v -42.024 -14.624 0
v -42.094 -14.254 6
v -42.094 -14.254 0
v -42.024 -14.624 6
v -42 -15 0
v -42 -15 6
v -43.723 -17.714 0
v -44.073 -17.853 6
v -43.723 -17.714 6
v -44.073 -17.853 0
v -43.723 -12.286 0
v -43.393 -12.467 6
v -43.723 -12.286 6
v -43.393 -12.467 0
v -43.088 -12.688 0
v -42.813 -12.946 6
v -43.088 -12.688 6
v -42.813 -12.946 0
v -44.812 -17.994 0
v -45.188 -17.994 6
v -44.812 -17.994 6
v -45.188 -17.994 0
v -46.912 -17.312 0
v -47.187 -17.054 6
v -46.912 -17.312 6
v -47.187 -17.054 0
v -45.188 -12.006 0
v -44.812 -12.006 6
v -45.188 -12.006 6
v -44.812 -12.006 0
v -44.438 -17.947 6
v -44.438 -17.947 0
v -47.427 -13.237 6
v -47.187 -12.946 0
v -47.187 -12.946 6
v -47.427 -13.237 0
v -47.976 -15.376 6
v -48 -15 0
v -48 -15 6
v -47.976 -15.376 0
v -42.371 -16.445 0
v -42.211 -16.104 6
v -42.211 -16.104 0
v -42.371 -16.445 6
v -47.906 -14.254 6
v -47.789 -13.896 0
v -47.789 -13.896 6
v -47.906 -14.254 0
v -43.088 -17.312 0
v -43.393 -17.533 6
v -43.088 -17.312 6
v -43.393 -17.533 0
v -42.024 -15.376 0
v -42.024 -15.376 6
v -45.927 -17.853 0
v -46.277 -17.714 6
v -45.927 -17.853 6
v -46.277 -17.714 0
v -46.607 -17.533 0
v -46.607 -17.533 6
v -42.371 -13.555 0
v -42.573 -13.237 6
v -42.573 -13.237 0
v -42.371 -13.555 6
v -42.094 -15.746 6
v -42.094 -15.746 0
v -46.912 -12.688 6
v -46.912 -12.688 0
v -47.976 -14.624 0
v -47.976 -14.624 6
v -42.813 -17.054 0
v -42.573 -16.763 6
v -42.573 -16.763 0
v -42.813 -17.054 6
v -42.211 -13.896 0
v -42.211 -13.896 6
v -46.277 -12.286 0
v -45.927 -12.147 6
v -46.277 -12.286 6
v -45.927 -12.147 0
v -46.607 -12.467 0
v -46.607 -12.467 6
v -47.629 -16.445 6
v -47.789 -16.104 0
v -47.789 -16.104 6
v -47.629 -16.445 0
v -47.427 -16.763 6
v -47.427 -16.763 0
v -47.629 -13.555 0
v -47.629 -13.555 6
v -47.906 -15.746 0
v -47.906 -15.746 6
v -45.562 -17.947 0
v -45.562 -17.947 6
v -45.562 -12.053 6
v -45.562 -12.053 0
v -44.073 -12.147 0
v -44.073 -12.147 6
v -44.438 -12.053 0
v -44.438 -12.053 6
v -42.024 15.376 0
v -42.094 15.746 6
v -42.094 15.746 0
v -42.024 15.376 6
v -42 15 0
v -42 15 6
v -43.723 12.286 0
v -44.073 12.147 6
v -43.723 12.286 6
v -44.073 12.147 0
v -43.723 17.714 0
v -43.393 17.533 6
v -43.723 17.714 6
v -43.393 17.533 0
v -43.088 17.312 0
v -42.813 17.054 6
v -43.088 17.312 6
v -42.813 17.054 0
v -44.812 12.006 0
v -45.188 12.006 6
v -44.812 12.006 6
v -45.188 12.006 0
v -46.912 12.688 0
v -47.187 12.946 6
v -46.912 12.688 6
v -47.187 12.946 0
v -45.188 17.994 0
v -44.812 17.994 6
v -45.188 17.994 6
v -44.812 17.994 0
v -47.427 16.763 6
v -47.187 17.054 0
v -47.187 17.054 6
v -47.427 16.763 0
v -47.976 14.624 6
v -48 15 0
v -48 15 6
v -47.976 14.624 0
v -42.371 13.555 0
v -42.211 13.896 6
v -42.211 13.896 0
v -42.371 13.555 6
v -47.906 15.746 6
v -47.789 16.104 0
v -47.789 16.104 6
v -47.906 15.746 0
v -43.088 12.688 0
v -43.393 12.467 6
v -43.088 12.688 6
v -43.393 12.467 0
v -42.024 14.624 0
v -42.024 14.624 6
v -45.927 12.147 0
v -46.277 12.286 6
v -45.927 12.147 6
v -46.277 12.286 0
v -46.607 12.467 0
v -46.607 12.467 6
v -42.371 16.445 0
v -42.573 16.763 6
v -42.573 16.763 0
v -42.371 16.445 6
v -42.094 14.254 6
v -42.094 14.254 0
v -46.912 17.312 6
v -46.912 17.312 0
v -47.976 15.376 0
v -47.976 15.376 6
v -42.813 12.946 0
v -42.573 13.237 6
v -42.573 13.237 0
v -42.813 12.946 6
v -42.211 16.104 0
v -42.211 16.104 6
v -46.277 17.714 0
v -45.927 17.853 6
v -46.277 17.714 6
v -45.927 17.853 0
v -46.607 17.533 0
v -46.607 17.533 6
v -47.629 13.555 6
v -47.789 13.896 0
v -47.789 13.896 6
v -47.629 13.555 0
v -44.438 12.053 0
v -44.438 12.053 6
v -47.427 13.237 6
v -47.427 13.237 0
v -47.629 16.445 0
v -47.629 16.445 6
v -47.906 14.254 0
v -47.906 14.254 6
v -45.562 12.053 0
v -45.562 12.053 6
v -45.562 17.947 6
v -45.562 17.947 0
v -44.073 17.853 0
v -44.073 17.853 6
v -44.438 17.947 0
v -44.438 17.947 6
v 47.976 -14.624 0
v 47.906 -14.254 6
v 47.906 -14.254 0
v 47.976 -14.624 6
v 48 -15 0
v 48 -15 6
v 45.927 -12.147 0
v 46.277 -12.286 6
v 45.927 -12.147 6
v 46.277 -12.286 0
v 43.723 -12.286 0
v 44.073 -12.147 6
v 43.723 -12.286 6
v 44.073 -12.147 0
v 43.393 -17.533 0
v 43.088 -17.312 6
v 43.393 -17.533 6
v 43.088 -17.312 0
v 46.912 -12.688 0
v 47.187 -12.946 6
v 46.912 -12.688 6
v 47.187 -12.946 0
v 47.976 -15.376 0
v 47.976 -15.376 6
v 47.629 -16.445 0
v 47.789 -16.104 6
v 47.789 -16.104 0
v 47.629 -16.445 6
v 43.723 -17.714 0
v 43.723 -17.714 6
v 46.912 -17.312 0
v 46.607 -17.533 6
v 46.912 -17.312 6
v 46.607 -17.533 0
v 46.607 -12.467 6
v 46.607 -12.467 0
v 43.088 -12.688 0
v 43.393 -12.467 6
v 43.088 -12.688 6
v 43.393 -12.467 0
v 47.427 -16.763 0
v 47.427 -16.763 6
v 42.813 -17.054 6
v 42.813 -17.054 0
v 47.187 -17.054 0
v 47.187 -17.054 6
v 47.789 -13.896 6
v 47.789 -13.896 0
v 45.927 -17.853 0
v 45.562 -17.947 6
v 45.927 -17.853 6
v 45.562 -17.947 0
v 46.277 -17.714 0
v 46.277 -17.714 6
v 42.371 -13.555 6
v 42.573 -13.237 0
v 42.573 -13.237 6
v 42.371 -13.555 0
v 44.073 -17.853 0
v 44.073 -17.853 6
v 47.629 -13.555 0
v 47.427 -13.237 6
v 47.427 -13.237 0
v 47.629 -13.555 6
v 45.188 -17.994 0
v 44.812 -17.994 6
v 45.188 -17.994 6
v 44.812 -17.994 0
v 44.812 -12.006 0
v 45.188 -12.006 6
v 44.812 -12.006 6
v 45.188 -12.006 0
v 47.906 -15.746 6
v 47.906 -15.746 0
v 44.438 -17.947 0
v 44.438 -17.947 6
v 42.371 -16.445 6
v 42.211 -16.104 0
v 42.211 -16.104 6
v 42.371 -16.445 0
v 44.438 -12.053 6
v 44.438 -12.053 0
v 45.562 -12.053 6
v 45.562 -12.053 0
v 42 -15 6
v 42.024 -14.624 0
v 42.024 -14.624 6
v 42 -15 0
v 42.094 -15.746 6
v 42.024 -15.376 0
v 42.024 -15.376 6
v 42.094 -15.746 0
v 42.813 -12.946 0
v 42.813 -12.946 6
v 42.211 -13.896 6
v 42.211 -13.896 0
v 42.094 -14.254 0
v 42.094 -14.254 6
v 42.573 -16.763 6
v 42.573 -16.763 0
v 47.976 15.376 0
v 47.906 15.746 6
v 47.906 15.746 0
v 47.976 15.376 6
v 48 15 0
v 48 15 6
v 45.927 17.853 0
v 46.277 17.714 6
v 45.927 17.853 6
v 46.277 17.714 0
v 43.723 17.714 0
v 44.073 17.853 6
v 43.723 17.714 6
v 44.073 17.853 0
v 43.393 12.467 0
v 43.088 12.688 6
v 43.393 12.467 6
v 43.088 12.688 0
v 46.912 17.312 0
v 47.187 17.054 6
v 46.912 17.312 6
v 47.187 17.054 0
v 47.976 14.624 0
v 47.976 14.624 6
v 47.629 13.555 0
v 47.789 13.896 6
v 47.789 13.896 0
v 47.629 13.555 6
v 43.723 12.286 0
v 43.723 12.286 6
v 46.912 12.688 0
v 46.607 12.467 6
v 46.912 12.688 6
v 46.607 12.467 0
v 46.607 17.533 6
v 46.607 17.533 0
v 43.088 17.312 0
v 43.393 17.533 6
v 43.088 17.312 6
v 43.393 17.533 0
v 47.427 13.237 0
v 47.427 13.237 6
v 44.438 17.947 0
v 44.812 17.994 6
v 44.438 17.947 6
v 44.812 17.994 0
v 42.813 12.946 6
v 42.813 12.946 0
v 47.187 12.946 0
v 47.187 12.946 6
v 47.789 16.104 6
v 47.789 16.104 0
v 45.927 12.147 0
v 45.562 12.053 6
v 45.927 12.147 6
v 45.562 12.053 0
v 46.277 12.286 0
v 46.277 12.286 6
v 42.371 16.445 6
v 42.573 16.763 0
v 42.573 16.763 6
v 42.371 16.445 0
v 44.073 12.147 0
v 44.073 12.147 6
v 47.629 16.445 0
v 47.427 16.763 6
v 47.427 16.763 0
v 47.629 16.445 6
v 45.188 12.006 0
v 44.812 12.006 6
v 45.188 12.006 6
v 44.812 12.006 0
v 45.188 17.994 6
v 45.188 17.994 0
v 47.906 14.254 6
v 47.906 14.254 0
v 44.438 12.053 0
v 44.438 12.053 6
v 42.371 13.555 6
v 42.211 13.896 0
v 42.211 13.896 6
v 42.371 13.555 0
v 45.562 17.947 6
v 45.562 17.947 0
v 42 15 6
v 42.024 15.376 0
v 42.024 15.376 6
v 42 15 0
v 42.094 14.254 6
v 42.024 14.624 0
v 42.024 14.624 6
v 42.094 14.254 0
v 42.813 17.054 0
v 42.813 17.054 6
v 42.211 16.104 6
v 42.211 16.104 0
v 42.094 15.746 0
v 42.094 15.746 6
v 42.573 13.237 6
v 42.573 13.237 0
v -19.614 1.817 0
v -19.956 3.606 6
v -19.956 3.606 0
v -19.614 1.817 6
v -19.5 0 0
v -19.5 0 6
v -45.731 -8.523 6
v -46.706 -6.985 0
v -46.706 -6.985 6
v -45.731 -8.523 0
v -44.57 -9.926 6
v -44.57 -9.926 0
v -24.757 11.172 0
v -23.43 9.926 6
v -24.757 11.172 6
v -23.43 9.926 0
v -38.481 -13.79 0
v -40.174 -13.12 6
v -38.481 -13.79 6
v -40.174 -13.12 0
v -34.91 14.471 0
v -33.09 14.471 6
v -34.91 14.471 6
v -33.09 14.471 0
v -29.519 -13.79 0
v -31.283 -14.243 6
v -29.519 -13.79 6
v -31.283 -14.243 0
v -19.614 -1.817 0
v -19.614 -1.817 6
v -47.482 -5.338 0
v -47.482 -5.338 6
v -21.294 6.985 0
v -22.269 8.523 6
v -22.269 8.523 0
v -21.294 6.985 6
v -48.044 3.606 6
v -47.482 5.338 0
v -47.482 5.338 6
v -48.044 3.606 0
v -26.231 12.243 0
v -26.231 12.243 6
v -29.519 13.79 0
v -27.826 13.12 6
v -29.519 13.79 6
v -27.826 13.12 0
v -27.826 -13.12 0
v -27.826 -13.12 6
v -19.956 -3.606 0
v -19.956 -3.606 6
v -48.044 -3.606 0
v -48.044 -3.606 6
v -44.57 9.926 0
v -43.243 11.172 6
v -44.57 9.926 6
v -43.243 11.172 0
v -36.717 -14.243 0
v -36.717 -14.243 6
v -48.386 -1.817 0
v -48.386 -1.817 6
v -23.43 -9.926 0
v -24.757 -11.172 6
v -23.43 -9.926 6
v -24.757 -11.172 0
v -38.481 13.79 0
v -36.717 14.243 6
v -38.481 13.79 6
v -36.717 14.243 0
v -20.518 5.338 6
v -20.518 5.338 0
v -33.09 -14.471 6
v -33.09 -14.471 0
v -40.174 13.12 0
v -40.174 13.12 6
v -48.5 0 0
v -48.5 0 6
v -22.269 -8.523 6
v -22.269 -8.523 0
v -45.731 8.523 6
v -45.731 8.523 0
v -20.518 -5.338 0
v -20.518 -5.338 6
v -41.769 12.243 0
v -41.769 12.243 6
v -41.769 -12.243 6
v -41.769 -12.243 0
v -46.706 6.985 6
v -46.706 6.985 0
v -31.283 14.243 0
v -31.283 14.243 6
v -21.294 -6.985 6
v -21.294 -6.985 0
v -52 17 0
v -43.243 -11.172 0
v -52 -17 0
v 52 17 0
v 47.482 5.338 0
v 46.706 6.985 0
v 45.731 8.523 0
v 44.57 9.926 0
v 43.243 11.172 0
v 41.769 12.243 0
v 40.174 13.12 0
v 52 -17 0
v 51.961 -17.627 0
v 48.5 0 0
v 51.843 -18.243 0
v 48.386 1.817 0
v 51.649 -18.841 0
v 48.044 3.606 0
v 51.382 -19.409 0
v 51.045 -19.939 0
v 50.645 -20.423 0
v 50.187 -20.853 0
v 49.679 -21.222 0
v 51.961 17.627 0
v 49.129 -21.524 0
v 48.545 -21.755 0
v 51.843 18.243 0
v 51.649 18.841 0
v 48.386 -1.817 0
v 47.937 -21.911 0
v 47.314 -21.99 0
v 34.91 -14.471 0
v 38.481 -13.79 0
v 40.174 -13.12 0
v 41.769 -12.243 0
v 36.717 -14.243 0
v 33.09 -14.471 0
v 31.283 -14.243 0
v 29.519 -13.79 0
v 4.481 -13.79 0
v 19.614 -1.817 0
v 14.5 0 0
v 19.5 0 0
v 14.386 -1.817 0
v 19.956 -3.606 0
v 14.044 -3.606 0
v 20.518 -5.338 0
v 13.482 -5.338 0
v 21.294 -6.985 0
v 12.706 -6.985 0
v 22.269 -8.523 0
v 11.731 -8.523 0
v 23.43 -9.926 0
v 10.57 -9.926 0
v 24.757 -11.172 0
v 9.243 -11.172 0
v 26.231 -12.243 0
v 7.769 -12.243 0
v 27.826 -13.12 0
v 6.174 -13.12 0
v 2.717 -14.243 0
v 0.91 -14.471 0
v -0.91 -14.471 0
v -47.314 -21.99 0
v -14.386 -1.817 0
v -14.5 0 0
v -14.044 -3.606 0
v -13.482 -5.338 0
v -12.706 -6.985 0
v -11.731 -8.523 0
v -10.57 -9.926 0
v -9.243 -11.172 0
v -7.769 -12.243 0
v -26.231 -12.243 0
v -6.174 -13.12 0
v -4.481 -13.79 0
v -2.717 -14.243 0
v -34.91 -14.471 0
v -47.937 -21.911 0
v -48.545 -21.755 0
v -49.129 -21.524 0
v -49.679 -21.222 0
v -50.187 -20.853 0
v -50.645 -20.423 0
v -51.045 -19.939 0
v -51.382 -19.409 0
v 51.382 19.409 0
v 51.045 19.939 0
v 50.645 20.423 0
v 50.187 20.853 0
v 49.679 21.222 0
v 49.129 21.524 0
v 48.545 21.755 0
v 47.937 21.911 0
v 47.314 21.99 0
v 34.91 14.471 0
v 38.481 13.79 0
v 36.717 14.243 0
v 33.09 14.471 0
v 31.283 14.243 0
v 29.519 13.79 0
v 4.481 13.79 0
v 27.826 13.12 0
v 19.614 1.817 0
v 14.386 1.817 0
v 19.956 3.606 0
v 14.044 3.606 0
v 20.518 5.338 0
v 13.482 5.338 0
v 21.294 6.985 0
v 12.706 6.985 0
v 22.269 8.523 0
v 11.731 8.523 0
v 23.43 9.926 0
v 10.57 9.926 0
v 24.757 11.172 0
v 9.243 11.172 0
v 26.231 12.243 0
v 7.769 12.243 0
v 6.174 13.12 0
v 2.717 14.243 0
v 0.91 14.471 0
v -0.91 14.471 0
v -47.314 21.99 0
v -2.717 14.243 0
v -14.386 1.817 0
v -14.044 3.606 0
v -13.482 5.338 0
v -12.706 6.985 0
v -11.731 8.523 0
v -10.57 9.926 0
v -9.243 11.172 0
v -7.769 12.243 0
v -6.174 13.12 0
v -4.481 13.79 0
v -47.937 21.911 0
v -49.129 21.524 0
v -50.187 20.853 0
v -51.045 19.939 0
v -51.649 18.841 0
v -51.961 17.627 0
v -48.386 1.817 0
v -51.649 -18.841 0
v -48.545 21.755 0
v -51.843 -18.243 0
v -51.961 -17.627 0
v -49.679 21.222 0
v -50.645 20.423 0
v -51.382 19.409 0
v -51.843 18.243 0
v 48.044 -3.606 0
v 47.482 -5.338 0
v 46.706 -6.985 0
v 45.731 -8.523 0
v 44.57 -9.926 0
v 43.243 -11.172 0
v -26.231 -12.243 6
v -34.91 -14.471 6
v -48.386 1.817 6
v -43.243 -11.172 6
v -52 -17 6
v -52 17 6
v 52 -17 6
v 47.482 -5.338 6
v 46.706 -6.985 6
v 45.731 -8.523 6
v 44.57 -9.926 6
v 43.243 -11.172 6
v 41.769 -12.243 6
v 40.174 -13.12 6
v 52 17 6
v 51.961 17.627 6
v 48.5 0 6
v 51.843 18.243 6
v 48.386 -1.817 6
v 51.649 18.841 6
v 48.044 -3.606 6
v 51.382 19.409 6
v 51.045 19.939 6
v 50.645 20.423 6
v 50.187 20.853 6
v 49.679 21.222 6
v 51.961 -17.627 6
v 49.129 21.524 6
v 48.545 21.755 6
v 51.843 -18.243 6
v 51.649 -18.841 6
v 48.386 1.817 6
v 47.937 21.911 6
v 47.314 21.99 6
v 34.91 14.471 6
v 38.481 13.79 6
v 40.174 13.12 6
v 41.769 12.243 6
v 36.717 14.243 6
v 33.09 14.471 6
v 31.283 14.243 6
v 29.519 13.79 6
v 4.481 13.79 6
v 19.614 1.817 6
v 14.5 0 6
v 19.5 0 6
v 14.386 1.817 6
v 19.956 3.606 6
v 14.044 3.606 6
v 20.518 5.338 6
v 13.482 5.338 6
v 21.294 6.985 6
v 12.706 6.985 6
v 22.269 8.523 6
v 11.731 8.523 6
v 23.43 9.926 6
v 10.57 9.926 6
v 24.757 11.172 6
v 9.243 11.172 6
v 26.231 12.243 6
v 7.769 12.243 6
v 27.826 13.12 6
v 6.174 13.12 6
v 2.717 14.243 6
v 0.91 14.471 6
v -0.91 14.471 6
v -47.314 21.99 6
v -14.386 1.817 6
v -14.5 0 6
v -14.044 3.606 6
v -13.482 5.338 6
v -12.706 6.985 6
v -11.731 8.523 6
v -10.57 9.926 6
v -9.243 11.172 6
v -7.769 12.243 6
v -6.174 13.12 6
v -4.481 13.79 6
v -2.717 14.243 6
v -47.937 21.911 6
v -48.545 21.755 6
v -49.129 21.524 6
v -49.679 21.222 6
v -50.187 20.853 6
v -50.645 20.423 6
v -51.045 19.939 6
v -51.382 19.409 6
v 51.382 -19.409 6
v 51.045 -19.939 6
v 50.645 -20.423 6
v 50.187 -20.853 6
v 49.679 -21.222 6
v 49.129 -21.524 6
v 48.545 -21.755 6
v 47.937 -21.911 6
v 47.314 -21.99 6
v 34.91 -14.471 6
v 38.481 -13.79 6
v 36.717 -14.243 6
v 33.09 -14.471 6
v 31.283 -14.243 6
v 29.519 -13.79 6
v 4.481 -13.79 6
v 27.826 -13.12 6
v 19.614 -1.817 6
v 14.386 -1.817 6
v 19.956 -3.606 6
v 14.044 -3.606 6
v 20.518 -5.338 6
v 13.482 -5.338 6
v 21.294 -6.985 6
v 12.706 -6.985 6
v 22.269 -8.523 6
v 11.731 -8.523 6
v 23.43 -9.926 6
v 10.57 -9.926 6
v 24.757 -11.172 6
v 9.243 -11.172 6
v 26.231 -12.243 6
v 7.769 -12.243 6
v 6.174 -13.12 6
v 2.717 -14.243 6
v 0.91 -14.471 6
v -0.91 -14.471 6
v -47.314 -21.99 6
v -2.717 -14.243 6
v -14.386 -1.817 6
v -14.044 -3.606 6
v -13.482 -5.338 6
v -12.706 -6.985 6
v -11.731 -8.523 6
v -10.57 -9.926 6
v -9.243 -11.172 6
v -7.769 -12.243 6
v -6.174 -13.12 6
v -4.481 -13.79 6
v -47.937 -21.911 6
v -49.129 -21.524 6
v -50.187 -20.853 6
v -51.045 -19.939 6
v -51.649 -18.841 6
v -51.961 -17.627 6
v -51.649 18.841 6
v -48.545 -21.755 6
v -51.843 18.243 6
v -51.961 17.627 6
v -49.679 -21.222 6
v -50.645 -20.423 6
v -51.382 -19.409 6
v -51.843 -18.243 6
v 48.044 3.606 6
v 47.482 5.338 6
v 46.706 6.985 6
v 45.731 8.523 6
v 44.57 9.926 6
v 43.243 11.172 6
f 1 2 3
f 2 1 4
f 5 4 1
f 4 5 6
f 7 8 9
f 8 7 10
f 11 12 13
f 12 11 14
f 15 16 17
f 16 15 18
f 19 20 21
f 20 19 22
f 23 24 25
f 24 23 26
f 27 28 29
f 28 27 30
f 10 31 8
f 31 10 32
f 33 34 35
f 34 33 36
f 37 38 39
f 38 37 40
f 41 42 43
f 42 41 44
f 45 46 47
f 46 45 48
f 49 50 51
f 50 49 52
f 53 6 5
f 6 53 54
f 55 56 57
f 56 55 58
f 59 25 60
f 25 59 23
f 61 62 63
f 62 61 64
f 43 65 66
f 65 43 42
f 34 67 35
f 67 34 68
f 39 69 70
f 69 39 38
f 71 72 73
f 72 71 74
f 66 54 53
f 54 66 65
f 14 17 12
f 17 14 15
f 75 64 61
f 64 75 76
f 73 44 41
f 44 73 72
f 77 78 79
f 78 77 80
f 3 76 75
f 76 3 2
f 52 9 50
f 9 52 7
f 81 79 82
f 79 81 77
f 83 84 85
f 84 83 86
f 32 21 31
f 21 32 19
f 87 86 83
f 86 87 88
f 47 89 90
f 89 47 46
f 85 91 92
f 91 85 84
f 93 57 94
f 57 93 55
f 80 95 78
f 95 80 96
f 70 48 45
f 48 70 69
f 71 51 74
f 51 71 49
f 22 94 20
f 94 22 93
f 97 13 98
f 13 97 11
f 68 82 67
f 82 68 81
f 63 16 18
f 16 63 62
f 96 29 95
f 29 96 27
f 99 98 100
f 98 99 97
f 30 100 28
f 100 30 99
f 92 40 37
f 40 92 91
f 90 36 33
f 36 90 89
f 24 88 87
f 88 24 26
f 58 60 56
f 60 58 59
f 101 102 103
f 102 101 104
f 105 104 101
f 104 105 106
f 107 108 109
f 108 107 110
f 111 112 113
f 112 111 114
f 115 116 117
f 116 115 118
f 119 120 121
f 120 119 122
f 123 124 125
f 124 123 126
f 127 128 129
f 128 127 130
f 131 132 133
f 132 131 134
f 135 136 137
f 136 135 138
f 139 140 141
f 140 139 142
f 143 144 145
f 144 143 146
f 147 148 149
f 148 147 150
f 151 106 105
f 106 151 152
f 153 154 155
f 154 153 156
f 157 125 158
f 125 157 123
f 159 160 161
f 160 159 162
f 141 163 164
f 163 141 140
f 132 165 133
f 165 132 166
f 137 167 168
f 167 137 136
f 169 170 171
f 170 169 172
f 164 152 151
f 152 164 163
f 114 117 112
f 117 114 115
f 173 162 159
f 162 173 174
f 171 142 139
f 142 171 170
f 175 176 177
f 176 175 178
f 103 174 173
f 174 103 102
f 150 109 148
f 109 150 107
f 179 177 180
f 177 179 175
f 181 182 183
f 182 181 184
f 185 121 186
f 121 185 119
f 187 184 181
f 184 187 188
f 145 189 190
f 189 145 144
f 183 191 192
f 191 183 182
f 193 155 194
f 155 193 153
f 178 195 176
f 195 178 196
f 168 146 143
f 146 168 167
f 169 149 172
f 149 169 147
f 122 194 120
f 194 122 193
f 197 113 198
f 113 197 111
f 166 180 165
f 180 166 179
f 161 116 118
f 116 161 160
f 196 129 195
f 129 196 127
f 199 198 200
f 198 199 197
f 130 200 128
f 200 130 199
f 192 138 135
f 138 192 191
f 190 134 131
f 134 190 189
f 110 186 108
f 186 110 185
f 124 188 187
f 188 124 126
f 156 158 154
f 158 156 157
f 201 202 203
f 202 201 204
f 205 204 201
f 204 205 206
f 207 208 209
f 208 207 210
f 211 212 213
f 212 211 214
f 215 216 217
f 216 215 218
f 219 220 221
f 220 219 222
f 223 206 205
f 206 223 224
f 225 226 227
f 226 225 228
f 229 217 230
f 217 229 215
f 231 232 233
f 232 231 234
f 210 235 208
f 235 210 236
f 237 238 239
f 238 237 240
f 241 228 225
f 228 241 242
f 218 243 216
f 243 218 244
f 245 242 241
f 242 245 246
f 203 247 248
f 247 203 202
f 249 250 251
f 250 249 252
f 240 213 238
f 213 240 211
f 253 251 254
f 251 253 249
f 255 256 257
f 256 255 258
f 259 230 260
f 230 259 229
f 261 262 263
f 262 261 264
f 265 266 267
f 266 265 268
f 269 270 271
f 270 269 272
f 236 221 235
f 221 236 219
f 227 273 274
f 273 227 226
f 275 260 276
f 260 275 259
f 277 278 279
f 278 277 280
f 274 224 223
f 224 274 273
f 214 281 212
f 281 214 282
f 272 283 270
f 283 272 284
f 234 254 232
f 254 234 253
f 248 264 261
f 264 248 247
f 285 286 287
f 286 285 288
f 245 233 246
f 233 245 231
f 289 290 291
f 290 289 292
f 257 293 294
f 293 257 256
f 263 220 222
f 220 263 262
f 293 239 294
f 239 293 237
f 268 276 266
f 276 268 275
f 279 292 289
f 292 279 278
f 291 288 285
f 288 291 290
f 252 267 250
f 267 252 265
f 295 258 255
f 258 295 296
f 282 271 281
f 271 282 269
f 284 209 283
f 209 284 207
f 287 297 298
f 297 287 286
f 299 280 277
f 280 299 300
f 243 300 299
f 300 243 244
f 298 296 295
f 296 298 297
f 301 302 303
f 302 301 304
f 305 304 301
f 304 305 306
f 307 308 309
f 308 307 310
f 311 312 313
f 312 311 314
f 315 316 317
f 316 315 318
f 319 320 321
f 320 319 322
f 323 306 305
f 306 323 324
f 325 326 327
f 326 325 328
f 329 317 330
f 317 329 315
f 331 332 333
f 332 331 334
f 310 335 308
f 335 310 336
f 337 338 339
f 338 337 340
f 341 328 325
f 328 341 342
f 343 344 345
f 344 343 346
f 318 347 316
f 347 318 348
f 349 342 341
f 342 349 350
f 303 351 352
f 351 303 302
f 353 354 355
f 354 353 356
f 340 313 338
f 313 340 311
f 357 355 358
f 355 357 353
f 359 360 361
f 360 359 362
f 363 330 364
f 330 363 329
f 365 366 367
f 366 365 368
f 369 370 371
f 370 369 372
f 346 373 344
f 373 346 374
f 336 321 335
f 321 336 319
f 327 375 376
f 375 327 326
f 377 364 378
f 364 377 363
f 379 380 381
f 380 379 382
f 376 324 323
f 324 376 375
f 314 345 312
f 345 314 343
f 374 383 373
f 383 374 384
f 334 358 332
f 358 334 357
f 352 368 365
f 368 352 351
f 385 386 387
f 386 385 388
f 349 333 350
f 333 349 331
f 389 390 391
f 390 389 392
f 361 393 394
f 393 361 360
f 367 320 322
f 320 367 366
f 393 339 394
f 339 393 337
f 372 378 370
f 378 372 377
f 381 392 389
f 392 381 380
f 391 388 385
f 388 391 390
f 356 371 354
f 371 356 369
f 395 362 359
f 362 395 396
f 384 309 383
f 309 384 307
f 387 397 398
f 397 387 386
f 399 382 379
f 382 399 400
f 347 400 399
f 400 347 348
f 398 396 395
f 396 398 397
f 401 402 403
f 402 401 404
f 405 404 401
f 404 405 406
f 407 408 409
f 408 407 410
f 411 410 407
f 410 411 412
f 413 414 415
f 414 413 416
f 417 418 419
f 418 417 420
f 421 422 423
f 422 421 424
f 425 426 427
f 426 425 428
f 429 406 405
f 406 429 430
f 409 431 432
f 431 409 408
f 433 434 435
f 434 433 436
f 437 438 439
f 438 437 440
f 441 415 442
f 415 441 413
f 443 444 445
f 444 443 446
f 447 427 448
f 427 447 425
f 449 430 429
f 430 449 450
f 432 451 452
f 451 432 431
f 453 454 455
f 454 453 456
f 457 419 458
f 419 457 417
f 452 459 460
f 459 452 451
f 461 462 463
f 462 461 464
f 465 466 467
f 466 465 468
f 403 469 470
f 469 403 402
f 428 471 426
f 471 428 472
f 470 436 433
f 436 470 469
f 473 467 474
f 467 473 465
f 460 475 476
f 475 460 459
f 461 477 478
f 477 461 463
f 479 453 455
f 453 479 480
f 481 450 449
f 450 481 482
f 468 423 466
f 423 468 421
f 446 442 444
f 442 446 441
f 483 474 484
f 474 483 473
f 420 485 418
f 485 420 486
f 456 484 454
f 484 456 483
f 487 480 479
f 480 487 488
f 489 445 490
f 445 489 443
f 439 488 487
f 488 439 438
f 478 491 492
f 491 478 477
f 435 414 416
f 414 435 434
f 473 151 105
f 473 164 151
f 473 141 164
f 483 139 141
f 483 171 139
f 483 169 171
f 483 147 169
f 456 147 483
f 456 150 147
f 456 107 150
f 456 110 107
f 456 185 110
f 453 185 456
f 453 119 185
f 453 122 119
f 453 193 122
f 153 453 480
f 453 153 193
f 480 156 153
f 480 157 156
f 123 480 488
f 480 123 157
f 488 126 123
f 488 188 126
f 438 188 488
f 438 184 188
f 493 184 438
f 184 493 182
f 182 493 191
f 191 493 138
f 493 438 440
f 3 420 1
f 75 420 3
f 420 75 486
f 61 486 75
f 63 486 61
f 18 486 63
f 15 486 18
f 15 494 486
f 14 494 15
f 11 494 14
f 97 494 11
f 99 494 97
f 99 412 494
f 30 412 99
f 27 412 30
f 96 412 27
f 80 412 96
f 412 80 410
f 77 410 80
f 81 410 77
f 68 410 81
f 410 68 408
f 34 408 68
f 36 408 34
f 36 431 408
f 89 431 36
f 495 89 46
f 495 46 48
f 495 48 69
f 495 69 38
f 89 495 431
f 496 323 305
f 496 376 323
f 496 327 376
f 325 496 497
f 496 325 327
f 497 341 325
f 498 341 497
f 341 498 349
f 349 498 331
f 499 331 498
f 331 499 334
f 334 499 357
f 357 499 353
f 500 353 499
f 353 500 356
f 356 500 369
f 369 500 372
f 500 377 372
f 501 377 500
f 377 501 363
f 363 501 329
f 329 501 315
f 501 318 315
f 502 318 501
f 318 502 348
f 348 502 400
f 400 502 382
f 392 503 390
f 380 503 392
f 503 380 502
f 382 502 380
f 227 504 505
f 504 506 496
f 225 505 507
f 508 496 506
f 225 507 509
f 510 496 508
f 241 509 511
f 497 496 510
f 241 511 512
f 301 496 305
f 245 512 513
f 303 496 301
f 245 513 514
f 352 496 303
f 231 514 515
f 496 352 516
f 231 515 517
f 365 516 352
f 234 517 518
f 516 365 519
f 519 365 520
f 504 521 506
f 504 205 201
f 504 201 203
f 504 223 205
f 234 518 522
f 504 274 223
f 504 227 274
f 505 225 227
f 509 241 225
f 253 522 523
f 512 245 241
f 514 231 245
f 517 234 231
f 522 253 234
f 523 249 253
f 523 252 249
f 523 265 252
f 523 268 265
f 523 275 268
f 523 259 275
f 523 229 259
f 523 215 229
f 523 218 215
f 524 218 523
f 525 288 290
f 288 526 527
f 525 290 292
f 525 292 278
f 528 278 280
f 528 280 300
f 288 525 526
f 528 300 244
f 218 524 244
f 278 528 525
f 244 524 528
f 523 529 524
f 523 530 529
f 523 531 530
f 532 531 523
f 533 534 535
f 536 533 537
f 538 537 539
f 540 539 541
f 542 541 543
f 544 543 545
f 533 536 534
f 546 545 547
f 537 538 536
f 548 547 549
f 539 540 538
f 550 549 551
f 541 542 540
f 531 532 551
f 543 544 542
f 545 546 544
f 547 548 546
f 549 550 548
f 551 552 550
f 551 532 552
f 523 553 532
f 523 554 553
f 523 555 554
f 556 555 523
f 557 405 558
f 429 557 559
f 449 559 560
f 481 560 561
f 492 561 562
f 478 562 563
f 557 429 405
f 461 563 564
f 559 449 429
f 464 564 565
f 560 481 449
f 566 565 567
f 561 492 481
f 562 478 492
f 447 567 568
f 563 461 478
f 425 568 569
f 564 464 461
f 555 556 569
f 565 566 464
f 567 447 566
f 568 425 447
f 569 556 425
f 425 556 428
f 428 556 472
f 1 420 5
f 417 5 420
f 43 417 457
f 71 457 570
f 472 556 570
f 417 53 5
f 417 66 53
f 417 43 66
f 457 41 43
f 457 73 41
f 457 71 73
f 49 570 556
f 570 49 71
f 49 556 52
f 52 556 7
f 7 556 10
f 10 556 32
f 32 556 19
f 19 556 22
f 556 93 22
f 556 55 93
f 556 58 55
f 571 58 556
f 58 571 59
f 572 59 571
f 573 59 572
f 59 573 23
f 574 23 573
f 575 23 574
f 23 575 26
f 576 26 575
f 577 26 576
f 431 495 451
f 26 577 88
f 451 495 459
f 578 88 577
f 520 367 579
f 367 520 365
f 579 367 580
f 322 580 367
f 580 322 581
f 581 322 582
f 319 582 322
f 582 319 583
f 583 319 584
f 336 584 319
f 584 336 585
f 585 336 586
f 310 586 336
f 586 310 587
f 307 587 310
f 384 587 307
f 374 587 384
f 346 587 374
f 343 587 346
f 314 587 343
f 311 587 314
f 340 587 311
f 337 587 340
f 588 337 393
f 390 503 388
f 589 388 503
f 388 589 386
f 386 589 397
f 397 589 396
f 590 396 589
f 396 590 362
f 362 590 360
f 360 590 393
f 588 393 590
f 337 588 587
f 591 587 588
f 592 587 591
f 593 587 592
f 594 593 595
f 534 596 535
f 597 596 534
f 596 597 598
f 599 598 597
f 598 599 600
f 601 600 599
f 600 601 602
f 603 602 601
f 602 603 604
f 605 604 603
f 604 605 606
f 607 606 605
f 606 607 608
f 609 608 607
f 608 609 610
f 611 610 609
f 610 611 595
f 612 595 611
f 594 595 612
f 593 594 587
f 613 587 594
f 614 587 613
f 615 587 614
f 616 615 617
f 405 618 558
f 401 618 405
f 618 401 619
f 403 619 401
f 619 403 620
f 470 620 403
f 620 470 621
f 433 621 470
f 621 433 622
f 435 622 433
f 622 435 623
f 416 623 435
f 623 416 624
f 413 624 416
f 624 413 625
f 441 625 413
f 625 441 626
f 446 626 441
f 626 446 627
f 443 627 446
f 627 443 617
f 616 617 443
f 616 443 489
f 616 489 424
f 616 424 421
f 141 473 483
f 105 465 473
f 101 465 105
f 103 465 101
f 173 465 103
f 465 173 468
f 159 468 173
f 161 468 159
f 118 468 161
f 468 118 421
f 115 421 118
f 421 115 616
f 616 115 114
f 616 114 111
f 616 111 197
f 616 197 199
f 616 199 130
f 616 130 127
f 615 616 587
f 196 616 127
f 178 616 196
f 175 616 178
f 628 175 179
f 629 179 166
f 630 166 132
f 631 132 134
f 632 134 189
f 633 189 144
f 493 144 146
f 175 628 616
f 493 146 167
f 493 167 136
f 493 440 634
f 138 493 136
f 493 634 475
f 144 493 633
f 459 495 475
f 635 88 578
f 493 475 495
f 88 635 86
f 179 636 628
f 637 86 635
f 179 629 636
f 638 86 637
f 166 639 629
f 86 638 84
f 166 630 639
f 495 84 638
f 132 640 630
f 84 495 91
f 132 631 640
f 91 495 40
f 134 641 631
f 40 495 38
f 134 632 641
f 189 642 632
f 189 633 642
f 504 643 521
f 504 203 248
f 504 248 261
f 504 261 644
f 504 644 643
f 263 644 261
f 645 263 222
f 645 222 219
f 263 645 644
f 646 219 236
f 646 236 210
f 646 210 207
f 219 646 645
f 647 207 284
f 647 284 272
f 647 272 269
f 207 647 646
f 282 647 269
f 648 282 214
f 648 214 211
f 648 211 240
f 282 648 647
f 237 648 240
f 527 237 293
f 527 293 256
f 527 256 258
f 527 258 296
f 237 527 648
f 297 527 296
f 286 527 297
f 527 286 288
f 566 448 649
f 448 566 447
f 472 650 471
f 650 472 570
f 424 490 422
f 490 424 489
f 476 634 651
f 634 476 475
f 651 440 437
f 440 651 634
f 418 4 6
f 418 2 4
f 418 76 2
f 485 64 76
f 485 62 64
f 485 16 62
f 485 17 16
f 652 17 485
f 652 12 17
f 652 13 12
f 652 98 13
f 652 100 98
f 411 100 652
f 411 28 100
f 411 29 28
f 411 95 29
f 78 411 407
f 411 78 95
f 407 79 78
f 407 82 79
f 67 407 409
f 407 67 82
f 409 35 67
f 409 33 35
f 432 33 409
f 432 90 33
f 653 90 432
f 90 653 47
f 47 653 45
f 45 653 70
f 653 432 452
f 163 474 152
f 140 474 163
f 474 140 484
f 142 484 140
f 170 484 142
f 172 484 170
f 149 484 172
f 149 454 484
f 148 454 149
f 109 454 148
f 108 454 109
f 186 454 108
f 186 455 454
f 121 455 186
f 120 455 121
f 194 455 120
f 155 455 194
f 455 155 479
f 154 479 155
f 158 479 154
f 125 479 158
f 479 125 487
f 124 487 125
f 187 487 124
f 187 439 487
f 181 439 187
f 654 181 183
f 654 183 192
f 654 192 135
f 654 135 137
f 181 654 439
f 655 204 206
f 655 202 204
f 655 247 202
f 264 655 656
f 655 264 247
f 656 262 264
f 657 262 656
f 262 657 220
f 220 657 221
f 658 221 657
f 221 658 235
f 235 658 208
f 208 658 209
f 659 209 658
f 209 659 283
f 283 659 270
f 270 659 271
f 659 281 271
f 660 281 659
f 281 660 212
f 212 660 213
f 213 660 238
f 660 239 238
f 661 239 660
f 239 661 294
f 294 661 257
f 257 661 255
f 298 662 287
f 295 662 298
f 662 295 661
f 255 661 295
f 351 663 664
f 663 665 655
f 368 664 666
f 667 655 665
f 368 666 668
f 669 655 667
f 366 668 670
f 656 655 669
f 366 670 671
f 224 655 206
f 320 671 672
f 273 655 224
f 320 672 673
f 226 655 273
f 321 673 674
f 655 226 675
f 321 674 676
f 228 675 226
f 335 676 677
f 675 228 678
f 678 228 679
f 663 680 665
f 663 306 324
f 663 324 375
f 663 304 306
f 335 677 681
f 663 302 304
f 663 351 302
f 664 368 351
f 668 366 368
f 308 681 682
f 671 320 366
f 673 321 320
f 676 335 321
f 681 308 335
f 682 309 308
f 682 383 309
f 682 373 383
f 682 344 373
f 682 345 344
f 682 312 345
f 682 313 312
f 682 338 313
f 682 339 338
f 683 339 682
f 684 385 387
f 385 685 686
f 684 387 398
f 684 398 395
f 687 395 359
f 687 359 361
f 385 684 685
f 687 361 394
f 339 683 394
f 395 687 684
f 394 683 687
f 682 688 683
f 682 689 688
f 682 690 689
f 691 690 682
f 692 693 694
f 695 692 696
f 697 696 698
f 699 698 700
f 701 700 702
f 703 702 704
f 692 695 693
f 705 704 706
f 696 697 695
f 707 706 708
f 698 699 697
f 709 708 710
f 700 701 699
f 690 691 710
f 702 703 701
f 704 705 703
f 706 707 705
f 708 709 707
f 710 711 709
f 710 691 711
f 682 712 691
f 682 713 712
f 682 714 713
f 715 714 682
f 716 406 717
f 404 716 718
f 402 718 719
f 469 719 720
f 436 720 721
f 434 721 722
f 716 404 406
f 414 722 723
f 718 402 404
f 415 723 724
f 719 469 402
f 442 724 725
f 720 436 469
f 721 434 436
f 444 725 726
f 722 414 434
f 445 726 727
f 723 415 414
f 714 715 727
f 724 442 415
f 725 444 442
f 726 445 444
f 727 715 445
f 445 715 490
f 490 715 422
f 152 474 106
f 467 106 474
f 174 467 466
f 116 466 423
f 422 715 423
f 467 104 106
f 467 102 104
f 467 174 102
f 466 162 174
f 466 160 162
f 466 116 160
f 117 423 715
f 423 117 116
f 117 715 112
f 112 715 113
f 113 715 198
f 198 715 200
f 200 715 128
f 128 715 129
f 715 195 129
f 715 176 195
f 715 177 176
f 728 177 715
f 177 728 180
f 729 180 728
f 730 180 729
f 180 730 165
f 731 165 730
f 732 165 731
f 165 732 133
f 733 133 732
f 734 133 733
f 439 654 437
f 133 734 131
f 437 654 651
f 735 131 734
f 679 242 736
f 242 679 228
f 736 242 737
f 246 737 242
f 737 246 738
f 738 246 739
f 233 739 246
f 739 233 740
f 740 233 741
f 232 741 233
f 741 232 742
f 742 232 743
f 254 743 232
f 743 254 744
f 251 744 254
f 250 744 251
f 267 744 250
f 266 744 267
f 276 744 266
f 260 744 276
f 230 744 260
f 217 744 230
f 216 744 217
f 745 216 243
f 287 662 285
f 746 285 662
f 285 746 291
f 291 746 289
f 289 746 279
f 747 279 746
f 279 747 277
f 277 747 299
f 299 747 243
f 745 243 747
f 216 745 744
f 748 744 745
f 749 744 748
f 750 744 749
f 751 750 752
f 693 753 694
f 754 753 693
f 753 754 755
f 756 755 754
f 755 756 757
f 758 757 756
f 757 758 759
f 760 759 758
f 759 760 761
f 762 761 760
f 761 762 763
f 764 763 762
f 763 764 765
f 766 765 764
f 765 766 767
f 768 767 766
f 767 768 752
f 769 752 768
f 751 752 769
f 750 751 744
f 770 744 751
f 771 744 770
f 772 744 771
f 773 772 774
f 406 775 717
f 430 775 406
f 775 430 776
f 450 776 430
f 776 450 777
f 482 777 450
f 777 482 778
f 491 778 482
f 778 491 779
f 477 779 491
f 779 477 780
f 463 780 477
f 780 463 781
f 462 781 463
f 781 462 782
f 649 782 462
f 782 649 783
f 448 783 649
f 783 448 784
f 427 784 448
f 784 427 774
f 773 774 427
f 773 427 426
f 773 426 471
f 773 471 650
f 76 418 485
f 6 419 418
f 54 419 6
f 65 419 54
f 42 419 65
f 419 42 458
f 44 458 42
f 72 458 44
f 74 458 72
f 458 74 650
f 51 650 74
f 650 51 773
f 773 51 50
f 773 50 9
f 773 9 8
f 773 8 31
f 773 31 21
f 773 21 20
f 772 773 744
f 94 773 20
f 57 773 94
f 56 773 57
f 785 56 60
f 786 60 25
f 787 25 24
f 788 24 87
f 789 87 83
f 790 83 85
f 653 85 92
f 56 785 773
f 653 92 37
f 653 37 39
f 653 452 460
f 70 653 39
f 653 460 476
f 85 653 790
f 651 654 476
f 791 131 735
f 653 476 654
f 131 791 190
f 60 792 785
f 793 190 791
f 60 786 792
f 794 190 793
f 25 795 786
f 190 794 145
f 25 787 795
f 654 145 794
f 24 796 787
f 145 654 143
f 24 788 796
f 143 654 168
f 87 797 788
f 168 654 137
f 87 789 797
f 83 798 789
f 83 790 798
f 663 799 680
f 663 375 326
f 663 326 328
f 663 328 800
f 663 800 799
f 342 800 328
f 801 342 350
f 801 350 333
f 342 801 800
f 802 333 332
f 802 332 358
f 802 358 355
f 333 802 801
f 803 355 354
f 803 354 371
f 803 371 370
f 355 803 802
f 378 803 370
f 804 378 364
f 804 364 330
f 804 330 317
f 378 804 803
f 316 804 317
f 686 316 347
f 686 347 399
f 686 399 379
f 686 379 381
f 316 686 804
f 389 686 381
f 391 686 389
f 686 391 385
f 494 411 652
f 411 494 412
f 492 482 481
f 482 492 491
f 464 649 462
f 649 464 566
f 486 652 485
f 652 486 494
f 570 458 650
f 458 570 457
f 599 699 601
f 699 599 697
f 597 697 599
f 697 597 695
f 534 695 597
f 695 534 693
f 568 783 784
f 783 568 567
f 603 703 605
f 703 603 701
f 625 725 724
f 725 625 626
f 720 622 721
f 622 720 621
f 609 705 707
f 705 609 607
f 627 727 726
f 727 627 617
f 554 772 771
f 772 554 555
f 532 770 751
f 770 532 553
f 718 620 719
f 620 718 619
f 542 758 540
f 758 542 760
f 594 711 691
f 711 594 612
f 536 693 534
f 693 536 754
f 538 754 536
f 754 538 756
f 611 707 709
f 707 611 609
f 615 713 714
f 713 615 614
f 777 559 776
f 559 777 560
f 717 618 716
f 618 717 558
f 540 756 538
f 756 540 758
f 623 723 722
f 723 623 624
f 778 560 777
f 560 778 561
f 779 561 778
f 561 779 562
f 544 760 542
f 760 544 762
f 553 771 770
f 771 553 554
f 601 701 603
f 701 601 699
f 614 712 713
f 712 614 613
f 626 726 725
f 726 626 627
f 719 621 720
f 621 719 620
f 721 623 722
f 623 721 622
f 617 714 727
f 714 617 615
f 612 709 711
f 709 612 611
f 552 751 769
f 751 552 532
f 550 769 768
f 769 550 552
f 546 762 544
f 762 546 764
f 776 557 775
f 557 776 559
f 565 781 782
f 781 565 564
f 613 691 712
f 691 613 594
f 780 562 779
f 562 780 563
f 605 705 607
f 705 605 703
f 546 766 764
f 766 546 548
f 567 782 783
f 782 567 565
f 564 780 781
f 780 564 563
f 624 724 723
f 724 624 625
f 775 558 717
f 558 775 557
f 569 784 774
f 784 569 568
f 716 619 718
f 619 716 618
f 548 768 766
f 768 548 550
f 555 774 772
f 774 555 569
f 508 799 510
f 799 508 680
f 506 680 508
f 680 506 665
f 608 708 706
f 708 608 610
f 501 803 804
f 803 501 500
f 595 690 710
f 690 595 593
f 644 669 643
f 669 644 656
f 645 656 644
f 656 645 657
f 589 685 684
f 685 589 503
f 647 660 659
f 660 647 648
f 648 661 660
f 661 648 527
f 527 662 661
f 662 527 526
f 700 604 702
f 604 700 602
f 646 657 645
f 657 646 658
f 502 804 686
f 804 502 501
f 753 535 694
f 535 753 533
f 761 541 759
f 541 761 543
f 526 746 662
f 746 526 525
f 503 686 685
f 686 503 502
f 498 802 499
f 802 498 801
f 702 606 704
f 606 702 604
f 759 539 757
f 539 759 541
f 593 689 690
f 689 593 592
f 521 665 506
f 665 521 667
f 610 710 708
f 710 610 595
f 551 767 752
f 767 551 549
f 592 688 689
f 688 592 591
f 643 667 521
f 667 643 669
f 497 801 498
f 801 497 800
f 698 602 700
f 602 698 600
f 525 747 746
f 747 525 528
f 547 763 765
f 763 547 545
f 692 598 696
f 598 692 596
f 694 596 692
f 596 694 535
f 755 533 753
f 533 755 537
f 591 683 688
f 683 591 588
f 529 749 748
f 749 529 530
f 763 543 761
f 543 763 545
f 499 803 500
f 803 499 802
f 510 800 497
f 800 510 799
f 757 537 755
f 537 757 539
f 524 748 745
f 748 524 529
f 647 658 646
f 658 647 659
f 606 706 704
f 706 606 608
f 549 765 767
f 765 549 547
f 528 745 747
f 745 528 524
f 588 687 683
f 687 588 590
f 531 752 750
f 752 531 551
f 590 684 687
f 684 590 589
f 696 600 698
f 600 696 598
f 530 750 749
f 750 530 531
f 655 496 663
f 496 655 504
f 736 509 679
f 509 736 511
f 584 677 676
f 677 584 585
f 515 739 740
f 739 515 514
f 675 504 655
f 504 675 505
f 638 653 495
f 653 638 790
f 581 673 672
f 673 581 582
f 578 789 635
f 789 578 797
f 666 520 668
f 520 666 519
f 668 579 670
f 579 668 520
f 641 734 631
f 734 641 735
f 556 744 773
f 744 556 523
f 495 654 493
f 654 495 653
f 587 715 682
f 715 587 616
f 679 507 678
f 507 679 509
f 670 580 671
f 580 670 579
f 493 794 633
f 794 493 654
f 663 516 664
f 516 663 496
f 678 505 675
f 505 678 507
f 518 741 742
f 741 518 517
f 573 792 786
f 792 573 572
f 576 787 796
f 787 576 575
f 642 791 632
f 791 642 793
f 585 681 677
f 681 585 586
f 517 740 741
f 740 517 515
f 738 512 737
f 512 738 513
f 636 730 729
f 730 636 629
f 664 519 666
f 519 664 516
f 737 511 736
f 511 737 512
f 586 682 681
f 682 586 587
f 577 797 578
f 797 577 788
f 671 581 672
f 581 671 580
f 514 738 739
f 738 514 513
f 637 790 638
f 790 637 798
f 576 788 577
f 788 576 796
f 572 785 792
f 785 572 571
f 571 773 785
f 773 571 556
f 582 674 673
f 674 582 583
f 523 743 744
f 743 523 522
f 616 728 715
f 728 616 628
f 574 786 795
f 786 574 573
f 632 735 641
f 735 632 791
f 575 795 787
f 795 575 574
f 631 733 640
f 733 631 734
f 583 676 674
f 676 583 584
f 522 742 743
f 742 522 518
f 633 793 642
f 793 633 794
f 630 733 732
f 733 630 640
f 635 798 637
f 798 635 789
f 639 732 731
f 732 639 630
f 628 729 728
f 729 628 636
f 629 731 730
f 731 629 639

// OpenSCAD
$fn = 50;


difference() {
	union() {
		hull() {
			translate(v = [-47.0000000000, 17.0000000000, 0]) {
				cylinder(h = 6, r = 5);
			}
			translate(v = [47.0000000000, 17.0000000000, 0]) {
				cylinder(h = 6, r = 5);
			}
			translate(v = [-47.0000000000, -17.0000000000, 0]) {
				cylinder(h = 6, r = 5);
			}
			translate(v = [47.0000000000, -17.0000000000, 0]) {
				cylinder(h = 6, r = 5);
			}
		}
	}
	union() {
		#translate(v = [-45.0000000000, -15.0000000000, -100.0000000000]) {
			cylinder(h = 200, r = 3.0000000000);
		}
		#translate(v = [-45.0000000000, 15.0000000000, -100.0000000000]) {
			cylinder(h = 200, r = 3.0000000000);
		}
		#translate(v = [45.0000000000, -15.0000000000, -100.0000000000]) {
			cylinder(h = 200, r = 3.0000000000);
		}
		#translate(v = [45.0000000000, 15.0000000000, -100.0000000000]) {
			cylinder(h = 200, r = 3.0000000000);
		}
		#translate(v = [-34.0000000000, 0, 0]) {
			cylinder(h = 6, r = 14.5000000000);
		}
		#cylinder(h = 6, r = 14.5000000000);
		#translate(v = [34.0000000000, 0, 0]) {
			cylinder(h = 6, r = 14.5000000000);
		}
	}
}
